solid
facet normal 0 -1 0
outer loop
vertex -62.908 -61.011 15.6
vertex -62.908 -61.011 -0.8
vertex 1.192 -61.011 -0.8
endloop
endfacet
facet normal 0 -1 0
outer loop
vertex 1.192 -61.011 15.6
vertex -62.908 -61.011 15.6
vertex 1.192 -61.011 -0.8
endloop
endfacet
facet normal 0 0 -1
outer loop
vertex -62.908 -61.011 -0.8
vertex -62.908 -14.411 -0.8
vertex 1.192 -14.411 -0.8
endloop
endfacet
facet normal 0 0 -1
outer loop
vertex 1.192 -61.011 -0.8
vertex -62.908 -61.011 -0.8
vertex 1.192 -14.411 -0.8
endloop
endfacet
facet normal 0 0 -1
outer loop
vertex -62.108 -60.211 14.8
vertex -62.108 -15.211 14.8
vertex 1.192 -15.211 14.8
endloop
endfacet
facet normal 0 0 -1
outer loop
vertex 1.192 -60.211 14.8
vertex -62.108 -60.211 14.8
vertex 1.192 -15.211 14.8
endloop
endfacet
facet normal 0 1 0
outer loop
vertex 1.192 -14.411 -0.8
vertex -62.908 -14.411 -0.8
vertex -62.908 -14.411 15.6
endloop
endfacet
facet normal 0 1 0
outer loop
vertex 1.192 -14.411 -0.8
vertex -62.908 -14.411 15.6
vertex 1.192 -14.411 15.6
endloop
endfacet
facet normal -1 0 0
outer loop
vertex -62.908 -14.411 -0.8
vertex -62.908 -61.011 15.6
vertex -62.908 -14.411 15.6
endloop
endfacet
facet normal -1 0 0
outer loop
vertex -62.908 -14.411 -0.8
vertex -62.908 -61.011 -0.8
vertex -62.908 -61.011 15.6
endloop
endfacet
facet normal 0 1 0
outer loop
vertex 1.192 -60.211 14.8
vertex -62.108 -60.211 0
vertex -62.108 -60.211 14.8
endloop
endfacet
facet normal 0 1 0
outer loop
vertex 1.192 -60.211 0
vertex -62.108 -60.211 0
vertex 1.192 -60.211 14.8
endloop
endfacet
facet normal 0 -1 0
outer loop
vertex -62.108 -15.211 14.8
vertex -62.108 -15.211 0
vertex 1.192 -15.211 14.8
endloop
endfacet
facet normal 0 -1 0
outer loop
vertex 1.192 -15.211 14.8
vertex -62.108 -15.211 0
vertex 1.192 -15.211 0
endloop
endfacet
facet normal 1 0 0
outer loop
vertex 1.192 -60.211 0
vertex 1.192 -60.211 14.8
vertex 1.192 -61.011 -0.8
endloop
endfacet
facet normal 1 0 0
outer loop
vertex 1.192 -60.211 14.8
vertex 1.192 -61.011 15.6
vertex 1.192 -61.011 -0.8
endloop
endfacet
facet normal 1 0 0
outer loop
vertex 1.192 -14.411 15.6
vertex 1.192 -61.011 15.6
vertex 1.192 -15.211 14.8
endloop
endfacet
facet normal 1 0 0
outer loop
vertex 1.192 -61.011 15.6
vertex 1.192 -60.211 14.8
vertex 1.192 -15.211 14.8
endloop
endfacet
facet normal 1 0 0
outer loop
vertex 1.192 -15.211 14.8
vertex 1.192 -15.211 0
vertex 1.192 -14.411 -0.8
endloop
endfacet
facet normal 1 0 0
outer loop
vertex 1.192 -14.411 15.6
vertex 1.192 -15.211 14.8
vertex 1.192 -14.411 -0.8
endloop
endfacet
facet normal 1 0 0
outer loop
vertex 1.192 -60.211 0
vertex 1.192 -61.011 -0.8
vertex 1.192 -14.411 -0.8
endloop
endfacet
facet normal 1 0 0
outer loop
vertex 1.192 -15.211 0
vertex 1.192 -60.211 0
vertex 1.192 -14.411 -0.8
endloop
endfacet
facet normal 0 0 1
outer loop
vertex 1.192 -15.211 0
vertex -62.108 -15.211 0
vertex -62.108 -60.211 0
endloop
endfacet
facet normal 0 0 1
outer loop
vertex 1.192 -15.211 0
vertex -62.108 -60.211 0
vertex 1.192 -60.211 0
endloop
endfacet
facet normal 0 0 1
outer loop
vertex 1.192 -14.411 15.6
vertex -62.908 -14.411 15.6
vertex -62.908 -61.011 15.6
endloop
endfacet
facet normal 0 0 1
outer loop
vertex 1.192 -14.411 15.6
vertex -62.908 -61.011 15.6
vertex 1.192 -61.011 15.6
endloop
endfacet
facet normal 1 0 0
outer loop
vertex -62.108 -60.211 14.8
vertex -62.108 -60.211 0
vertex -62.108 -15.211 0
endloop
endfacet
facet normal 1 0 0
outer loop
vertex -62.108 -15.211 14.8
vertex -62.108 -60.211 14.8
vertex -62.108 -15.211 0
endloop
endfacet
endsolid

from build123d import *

# Parameters (mm, degrees)
F0_W     = 64.9
F0_H     = 46.6
F0_W_2   = 63.3
F0_H_2   = 45
F1_DEPTH = 0.8
F2_DEPTH = 14.8
F3_W     = 64.9
F3_H     = 46.6
F3_W_2   = 63.3
F3_H_2   = 45
F4_DEPTH = 0.8
F5_DEPTH = 0.8


with BuildPart() as f1:
    # F0 (on Top) → F1 (new body)
    with BuildSketch(Plane.XY):
        with Locations((-30.4580235958, -37.7106211)):
            Rectangle(F0_W, F0_H)
        with Locations((-30.4580235958, -37.7106211)):
            Rectangle(F0_W_2, F0_H_2, mode=Mode.SUBTRACT)
        with Locations((-30.4580235958, -37.7106211)):
            Rectangle(F0_W_2, F0_H_2)
    extrude(amount=-F1_DEPTH)

    # F0 (on Top) → F2 (join)
    with BuildSketch(Plane.XY):
        with Locations((-30.4580235958, -37.7106211)):
            Rectangle(F0_W, F0_H)
        with Locations((-30.4580235958, -37.7106211)):
            Rectangle(F0_W_2, F0_H_2, mode=Mode.SUBTRACT)
    extrude(amount=F2_DEPTH)

    # F3 (on face) → F4 (join)
    with BuildSketch(Plane.XY.offset(14.8)):
        with Locations((-30.4580235958, -37.7106211)):
            Rectangle(F3_W, F3_H)
        with Locations((-30.4580235958, -37.7106211)):
            Rectangle(F3_W_2, F3_H_2, mode=Mode.SUBTRACT)
        with Locations((-30.4580235958, -37.7106211)):
            Rectangle(F3_W_2, F3_H_2)
    extrude(amount=F4_DEPTH)

    # F5 (cut): a face of the model
    f5_faces = [f1.faces().sort_by_distance(p)[0] for p in [
        (1.9919764042, -37.7106211, 7.4),
    ]]
    extrude(f5_faces, amount=-F5_DEPTH, mode=Mode.SUBTRACT)


solid = f1.part
